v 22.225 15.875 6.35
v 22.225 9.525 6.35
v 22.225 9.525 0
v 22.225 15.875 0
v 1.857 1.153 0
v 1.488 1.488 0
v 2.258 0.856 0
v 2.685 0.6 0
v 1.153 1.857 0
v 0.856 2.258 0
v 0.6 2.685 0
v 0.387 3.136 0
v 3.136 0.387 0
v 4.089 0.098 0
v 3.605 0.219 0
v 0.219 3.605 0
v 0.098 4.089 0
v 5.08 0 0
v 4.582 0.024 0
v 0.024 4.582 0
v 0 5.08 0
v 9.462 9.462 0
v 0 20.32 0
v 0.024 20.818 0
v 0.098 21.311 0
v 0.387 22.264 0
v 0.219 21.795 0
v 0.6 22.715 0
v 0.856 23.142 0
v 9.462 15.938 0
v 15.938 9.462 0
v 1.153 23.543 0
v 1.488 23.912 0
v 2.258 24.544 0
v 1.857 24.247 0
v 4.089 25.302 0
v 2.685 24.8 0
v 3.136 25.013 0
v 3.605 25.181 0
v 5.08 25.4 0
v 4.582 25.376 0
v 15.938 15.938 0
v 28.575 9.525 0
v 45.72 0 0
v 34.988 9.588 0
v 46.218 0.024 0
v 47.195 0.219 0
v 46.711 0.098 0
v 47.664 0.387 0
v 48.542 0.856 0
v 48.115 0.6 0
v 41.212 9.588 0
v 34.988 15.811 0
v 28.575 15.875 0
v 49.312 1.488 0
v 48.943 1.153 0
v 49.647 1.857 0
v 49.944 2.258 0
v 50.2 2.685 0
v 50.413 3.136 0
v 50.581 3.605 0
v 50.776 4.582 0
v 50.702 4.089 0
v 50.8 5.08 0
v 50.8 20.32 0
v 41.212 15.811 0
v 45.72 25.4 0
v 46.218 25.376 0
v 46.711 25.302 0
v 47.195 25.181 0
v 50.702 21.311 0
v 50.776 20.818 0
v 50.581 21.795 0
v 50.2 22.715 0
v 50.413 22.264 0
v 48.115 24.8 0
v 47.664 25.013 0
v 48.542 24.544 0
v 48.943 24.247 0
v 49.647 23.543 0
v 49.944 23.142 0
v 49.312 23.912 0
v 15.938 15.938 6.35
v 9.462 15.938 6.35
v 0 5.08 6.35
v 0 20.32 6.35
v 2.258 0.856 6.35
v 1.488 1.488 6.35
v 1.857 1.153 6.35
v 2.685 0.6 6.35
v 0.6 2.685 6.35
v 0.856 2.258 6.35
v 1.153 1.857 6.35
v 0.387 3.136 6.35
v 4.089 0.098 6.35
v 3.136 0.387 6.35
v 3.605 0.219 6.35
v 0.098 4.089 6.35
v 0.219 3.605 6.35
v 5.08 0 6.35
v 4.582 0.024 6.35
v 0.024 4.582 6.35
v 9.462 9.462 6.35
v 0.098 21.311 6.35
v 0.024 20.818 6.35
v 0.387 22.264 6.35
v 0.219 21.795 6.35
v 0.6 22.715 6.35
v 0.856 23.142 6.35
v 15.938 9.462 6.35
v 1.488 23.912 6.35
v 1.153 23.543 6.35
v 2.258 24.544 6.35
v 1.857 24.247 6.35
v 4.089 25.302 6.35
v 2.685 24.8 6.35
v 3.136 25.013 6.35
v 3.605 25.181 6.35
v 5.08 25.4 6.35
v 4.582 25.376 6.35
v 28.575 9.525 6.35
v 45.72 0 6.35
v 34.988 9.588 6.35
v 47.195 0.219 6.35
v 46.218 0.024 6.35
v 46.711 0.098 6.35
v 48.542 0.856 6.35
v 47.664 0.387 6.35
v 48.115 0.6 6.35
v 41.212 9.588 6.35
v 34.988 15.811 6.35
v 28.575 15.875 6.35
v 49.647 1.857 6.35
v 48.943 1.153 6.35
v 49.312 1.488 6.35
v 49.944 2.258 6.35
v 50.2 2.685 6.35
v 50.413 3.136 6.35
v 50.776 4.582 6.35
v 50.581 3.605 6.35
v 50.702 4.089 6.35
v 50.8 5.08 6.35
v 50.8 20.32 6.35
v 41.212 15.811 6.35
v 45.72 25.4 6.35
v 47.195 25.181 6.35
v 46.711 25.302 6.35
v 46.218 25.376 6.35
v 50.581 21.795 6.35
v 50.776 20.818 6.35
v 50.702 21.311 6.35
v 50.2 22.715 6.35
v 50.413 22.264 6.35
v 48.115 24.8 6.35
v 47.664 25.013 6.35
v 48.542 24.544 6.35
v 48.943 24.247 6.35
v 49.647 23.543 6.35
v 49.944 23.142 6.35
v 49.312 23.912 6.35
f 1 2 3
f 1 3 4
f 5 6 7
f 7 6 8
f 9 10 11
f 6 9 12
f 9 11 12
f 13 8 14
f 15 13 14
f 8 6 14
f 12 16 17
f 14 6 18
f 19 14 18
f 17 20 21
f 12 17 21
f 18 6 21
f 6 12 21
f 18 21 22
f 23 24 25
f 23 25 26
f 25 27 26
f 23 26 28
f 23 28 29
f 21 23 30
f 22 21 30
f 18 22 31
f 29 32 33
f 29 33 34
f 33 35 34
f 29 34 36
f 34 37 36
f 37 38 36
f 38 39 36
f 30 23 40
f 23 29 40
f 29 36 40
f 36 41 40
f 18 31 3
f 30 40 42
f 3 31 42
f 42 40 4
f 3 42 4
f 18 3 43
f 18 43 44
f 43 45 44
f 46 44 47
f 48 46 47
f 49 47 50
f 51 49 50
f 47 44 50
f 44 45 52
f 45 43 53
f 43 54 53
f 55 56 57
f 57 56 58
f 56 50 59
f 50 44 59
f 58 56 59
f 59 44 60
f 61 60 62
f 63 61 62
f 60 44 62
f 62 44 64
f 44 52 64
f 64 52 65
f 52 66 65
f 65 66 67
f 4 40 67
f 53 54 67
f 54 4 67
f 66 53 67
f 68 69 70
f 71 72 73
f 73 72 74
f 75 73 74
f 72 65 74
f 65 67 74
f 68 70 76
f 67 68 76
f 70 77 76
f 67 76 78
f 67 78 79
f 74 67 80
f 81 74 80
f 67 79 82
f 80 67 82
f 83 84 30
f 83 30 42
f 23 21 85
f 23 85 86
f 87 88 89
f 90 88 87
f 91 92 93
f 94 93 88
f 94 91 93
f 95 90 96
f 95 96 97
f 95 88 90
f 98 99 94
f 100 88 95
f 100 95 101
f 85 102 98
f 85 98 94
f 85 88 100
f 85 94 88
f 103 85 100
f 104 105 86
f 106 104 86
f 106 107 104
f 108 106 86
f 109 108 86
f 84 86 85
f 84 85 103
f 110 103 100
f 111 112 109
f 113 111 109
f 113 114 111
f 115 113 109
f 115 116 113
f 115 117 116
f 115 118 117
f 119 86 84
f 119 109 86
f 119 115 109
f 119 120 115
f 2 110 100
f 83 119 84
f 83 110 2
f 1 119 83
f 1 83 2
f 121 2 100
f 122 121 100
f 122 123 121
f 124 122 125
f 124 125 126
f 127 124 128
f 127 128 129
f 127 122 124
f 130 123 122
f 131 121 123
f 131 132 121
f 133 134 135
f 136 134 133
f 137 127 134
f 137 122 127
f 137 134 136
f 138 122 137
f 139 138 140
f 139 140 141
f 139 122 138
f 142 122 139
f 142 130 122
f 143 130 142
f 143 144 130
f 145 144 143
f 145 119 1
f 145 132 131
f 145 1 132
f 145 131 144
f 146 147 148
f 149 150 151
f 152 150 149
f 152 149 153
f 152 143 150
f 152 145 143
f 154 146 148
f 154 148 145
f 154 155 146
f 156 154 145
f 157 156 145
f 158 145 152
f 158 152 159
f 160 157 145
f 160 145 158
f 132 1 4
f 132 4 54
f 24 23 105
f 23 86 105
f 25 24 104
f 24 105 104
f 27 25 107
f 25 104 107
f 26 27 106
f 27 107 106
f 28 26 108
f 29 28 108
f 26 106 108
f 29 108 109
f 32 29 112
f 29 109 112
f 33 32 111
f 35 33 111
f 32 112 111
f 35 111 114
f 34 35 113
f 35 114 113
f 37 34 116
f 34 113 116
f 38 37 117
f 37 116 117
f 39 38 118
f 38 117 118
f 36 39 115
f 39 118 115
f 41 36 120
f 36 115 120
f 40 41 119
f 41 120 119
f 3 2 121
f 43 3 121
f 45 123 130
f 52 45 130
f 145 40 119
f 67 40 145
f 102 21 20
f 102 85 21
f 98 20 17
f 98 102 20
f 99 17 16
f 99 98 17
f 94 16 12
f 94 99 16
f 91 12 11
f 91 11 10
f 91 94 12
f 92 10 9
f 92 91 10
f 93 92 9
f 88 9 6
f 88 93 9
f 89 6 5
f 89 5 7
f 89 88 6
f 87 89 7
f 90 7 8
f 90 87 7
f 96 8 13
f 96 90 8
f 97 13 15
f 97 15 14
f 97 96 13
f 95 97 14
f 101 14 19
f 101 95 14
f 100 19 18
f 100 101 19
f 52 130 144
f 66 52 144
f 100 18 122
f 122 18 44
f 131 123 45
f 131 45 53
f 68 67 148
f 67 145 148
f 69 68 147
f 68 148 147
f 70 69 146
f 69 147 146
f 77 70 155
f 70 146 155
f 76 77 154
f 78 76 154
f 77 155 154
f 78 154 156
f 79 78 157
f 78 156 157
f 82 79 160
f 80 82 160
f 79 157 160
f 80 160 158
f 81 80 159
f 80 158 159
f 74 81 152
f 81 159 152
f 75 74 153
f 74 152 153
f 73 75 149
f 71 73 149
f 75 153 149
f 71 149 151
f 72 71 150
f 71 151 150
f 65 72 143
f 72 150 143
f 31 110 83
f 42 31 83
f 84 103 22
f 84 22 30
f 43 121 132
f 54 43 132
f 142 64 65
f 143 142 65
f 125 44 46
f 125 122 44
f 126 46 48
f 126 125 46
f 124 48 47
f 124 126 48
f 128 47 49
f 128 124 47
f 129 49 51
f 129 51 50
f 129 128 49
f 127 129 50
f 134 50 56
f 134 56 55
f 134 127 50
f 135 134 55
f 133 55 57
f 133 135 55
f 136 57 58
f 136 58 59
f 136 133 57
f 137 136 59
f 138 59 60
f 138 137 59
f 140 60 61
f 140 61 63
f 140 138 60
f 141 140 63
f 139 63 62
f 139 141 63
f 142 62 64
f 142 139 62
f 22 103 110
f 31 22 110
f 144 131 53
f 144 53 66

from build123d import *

# Parameters (mm, degrees)
F0_W     = 50.8
F0_H     = 25.4
F1_DEPTH = 6.35
F2_W     = 6.477
F2_H     = 6.477
F2_W_2   = 6.35
F2_H_2   = 6.35
F2_W_3   = 6.223
F2_H_3   = 6.223
F3_DEPTH = 25.4
F4_R     = 5.08


with BuildPart() as f1:
    # F0 (on Top) → F1 (new body)
    with BuildSketch(Plane.XY):
        with Locations((25.4, 12.7)):
            Rectangle(F0_W, F0_H)
    extrude(amount=F1_DEPTH)

    # F2 (on face) → F3 (cut)
    with BuildSketch(Plane.XY.offset(6.35)):
        with Locations((12.7, 12.7)):
            Rectangle(F2_W, F2_H)
        with Locations((25.4, 12.7)):
            Rectangle(F2_W_2, F2_H_2)
        with Locations((38.1, 12.7)):
            Rectangle(F2_W_3, F2_H_3)
    extrude(amount=-F3_DEPTH, mode=Mode.SUBTRACT)

    # F4
    f4_edges = [f1.edges().sort_by_distance(p)[0] for p in [
        (0, 25.4, 3.175),
        (0, 0, 3.175),
        (50.8, 25.4, 3.175),
        (50.8, 0, 3.175),
    ]]
    fillet(f4_edges, radius=F4_R)


solid = f1.part
